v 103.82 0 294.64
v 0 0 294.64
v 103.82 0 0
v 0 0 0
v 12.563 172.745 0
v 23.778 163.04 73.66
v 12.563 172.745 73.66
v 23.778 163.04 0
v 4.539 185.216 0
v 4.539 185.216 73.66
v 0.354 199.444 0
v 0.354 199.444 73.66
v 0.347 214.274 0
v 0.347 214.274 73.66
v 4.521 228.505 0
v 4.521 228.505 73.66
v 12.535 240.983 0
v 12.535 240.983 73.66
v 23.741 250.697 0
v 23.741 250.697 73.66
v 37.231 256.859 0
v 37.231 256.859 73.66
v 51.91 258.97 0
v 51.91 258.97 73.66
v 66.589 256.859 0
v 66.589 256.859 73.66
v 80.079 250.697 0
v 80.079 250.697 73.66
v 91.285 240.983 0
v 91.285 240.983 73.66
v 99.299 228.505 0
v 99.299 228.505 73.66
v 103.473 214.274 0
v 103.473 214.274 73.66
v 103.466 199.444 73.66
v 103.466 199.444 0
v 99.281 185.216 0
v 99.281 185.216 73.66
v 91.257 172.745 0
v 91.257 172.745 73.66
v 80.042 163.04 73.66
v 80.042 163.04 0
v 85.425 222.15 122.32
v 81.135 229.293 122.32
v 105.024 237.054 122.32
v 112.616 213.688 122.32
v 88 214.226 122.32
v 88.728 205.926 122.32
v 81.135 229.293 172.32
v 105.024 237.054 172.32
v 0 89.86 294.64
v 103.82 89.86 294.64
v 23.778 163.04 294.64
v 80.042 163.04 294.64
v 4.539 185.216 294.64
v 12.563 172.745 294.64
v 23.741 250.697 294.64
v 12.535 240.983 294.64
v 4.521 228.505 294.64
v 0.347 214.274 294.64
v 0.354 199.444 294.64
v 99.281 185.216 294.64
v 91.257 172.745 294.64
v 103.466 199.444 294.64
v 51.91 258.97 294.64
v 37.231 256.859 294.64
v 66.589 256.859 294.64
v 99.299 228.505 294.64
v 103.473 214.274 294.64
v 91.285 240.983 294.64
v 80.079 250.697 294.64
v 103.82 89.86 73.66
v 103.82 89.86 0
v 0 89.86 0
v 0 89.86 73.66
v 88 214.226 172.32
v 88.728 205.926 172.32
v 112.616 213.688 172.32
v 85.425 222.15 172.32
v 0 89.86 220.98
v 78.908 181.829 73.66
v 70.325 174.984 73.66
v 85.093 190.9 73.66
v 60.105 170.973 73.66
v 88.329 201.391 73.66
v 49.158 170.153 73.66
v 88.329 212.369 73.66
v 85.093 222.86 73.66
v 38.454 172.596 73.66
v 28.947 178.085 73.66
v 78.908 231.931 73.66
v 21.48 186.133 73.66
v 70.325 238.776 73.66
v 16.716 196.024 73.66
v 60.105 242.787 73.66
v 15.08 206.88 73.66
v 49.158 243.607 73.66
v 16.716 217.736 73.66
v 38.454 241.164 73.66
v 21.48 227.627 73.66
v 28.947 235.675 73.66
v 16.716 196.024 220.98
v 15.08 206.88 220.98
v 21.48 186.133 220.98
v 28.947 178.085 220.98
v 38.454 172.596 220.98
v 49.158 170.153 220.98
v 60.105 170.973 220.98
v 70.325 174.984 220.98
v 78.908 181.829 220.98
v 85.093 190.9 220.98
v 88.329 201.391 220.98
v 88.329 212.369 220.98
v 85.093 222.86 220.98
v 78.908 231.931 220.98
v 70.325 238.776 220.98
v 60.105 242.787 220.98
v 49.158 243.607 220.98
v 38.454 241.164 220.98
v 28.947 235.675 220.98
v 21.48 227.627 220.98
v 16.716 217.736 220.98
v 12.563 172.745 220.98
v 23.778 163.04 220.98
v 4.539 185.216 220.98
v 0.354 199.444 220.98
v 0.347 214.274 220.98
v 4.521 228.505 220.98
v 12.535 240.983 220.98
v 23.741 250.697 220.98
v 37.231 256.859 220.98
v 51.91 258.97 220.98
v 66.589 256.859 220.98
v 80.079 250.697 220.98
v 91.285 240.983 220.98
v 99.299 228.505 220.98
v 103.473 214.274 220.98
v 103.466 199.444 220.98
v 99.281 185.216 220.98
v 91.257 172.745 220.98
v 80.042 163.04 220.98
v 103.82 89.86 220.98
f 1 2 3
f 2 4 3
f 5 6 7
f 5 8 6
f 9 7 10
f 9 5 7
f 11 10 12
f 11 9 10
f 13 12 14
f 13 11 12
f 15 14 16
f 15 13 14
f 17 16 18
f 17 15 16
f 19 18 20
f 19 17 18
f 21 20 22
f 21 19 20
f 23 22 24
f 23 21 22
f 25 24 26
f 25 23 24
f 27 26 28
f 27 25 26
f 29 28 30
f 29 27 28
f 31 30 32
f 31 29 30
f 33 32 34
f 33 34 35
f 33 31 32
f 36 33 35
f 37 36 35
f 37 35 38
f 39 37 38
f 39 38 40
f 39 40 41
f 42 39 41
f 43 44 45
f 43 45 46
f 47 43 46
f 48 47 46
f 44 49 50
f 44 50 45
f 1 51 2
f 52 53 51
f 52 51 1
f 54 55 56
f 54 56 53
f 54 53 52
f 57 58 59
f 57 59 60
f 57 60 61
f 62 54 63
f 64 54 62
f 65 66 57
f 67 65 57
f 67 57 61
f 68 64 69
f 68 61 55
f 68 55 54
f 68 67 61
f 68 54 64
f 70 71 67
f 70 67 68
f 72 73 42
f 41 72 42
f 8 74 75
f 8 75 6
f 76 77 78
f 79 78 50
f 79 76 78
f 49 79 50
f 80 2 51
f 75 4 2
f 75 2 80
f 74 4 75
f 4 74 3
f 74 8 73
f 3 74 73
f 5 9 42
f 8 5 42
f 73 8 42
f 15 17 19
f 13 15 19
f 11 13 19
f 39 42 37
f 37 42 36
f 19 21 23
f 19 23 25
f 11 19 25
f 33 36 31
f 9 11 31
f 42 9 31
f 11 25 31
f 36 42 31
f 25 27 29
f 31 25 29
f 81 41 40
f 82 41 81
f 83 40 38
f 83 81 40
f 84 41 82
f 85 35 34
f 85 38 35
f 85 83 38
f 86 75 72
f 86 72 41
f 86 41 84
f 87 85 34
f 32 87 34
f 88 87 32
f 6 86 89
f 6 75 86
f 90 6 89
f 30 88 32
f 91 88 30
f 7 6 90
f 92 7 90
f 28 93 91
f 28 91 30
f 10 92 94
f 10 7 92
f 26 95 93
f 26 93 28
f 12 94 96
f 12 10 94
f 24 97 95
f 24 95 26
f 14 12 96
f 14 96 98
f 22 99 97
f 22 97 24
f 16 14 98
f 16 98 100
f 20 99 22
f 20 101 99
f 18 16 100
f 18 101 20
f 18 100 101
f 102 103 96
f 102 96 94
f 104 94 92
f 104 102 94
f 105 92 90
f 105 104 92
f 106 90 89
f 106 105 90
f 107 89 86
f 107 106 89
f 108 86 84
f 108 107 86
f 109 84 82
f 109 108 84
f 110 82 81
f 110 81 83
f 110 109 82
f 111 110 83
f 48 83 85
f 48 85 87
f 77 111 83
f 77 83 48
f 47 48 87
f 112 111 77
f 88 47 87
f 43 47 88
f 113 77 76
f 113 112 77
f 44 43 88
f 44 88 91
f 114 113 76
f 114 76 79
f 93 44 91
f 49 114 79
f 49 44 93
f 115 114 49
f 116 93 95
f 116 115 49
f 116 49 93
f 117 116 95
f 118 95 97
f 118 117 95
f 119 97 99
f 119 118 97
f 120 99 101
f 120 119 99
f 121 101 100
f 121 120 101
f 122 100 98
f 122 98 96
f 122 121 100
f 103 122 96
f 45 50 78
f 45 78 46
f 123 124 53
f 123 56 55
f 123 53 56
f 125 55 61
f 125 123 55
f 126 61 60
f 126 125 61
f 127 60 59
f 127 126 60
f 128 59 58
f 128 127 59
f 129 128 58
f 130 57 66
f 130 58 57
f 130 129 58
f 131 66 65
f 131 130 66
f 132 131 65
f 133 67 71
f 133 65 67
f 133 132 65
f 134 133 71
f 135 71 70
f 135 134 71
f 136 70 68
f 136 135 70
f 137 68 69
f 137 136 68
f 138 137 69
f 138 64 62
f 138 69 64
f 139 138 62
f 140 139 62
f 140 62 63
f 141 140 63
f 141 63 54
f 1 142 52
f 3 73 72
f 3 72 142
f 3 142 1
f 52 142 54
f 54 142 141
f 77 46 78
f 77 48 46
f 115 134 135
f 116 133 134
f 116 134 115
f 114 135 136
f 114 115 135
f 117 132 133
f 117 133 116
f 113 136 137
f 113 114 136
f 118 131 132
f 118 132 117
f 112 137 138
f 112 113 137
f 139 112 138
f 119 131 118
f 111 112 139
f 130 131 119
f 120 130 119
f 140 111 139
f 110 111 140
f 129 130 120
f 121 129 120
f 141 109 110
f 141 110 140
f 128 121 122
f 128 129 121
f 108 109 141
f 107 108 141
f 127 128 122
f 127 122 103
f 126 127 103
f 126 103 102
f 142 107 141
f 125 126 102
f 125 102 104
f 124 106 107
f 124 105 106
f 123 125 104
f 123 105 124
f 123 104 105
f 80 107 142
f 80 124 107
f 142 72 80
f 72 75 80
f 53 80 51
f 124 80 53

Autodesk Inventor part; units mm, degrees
ref_plane "YZ Plane" through (0, 0, 0) normal (1, 0, 0) x (0, 1, 0)
ref_plane "XZ Plane" through (0, 0, 0) normal (0, 1, 0) x (-1, 0, 0)
ref_plane "XY Plane" through (0, 0, 0) normal (0, 0, 1) x (1, 0, 0)
sketch "Sketch1" plane through (0, 0, 0) normal (0, 0, 1) x (1, 0, 0)
  line L0 (0, 0) -> (103.82, 0)
  line L1 (0, 0) -> (0, 89.86)
  line L2 (103.82, 89.86) -> (103.82, 0)
  line L3 (103.82, 89.86) -> (80.0424, 163.0401)
  line L4 (0, 89.86) -> (23.7776, 163.0401)
  line L5 (0, 89.86) -> (103.82, 89.86)
  arc A0 (80.0424, 163.0401) -> (23.7776, 163.0401) centre (51.91, 206.88) ccw
  dimension "d1" = 89.86
sketch "Sketch2" plane through (0, 0, 0) normal (0, 0, 1) x (1, 0, 0)
  circle A0 centre (51.91, 206.8113) radius 52.09
  line L0 (0, 89.8599) -> (24.0879, 163.9947)
  line L1 (0, 89.8599) -> (77.95, 89.8599) construction
  point P0 (0, 0)
extrude "Extrusion1" add sketch "Sketch1" along normal blind 294.64
sketch "Sketch3" plane through (103.82, 0, 0) normal (1, 0, 0) x (0, 0, -1)
  line L0 (-294.64, 89.86) -> (-294.64, 0) projected
  line L1 (0, 89.86) -> (-294.64, 89.86) projected
  line L2 (-220.98, 89.86) -> (-73.66, 89.86)
  line L3 (-73.66, 89.86) -> (-73.66, 276.7764)
  line L4 (-73.66, 276.7764) -> (-220.98, 276.7764)
  line L5 (0, 163.0401) -> (-294.64, 163.0401) projected
  line L6 (-220.98, 276.7764) -> (-220.98, 89.86)
  point P0 (0, 0)
extrude "Extrusion2" cut sketch "Sketch3" along normal mid plane 294.64
sketch "Sketch4" plane through (0, 0, 0) normal (0, 0, -1) x (-1, 0, 0)
  point P0 (0, 0)
sketch "Sketch5" plane through (0, 0, 0) normal (0, 0, -1) x (-1, 0, 0)
  point P0 (0, 0)
sketch "Sketch6" plane through (0, 0, 294.64) normal (0, 0, 1) x (1, 0, 0)
  point P0 (0, 0)
sketch "Sketch7" plane through (51.91, 206.88, 73.66) normal (0, 0, 1) x (1, 0, 0)
  circle A0 centre (0, 0) radius 36.83
  point P0 (-51.91, -206.88)
  dimension "d23" = 73.66
extrude "Extrusion3" cut sketch "Sketch7" against normal blind 30
sketch "Sketch8" plane through (51.91, 206.88, 220.98) normal (0, 0, -1) x (-1, 0, 0)
  circle A0 centre (0, 0) radius 36.83
  point P0 (51.91, -206.88)
  dimension "d26" = 73.66
extrude "Extrusion4" cut sketch "Sketch8" against normal blind 30
sketch "Sketch9" plane through (51.91, 206.88, 250.98) normal (0, 0, -1) x (-1, 0, 0)
  circle A0 centre (0, 0) radius 36.83
  point P0 (51.91, -206.88)
  dimension "d29" = 73.66
extrude "Extrusion5" add sketch "Sketch9" along normal blind 207.32
ref_plane "Work Plane2" through (86.148, 100.9846, 220.98) normal (0.9511, 0.309, 0) x (0, 0, -1)
ref_plane "Work Plane1" through (51.91, 89.86, 220.98) normal (0.9511, 0.309, 0) x (0, 0, -1)
sketch "Sketch10" plane through (86.148, 100.9846, 220.98) normal (0.9511, 0.309, 0) x (0, 0, -1)
  line L0 (0, 148.1226) -> (0, 74.4626) construction
  line L1 (0, 111.2926) -> (147.32, 111.2926) construction
  line L2 (147.32, 74.4626) -> (147.32, 148.1226) construction
  line L3 (0, 148.1226) -> (147.32, 148.1226) construction
  line L4 (73.66, 148.1226) -> (73.66, 74.4626) construction
  line L5 (0, 74.4626) -> (147.32, 74.4626) construction
  line L6 (73.66, 111.2926) -> (48.66, 111.2926) construction
  line L7 (48.66, 111.2926) -> (48.66, 123.5771) construction
  line L8 (48.66, 123.5771) -> (98.66, 123.5771)
  line L9 (98.66, 123.5771) -> (98.66, 99.0081)
  line L10 (98.66, 99.0081) -> (48.66, 99.0081)
  line L11 (48.66, 99.0081) -> (48.66, 123.5771)
  point P0 (220.98, -69.4209)
  dimension "d33" = 25
  dimension "d34" = 12.2845
  dimension "d35" = 50
  dimension "d36" = 24.569
extrude "Extrusion6" add sketch "Sketch10" along normal blind 60
properties part number "Dish antenna base"
